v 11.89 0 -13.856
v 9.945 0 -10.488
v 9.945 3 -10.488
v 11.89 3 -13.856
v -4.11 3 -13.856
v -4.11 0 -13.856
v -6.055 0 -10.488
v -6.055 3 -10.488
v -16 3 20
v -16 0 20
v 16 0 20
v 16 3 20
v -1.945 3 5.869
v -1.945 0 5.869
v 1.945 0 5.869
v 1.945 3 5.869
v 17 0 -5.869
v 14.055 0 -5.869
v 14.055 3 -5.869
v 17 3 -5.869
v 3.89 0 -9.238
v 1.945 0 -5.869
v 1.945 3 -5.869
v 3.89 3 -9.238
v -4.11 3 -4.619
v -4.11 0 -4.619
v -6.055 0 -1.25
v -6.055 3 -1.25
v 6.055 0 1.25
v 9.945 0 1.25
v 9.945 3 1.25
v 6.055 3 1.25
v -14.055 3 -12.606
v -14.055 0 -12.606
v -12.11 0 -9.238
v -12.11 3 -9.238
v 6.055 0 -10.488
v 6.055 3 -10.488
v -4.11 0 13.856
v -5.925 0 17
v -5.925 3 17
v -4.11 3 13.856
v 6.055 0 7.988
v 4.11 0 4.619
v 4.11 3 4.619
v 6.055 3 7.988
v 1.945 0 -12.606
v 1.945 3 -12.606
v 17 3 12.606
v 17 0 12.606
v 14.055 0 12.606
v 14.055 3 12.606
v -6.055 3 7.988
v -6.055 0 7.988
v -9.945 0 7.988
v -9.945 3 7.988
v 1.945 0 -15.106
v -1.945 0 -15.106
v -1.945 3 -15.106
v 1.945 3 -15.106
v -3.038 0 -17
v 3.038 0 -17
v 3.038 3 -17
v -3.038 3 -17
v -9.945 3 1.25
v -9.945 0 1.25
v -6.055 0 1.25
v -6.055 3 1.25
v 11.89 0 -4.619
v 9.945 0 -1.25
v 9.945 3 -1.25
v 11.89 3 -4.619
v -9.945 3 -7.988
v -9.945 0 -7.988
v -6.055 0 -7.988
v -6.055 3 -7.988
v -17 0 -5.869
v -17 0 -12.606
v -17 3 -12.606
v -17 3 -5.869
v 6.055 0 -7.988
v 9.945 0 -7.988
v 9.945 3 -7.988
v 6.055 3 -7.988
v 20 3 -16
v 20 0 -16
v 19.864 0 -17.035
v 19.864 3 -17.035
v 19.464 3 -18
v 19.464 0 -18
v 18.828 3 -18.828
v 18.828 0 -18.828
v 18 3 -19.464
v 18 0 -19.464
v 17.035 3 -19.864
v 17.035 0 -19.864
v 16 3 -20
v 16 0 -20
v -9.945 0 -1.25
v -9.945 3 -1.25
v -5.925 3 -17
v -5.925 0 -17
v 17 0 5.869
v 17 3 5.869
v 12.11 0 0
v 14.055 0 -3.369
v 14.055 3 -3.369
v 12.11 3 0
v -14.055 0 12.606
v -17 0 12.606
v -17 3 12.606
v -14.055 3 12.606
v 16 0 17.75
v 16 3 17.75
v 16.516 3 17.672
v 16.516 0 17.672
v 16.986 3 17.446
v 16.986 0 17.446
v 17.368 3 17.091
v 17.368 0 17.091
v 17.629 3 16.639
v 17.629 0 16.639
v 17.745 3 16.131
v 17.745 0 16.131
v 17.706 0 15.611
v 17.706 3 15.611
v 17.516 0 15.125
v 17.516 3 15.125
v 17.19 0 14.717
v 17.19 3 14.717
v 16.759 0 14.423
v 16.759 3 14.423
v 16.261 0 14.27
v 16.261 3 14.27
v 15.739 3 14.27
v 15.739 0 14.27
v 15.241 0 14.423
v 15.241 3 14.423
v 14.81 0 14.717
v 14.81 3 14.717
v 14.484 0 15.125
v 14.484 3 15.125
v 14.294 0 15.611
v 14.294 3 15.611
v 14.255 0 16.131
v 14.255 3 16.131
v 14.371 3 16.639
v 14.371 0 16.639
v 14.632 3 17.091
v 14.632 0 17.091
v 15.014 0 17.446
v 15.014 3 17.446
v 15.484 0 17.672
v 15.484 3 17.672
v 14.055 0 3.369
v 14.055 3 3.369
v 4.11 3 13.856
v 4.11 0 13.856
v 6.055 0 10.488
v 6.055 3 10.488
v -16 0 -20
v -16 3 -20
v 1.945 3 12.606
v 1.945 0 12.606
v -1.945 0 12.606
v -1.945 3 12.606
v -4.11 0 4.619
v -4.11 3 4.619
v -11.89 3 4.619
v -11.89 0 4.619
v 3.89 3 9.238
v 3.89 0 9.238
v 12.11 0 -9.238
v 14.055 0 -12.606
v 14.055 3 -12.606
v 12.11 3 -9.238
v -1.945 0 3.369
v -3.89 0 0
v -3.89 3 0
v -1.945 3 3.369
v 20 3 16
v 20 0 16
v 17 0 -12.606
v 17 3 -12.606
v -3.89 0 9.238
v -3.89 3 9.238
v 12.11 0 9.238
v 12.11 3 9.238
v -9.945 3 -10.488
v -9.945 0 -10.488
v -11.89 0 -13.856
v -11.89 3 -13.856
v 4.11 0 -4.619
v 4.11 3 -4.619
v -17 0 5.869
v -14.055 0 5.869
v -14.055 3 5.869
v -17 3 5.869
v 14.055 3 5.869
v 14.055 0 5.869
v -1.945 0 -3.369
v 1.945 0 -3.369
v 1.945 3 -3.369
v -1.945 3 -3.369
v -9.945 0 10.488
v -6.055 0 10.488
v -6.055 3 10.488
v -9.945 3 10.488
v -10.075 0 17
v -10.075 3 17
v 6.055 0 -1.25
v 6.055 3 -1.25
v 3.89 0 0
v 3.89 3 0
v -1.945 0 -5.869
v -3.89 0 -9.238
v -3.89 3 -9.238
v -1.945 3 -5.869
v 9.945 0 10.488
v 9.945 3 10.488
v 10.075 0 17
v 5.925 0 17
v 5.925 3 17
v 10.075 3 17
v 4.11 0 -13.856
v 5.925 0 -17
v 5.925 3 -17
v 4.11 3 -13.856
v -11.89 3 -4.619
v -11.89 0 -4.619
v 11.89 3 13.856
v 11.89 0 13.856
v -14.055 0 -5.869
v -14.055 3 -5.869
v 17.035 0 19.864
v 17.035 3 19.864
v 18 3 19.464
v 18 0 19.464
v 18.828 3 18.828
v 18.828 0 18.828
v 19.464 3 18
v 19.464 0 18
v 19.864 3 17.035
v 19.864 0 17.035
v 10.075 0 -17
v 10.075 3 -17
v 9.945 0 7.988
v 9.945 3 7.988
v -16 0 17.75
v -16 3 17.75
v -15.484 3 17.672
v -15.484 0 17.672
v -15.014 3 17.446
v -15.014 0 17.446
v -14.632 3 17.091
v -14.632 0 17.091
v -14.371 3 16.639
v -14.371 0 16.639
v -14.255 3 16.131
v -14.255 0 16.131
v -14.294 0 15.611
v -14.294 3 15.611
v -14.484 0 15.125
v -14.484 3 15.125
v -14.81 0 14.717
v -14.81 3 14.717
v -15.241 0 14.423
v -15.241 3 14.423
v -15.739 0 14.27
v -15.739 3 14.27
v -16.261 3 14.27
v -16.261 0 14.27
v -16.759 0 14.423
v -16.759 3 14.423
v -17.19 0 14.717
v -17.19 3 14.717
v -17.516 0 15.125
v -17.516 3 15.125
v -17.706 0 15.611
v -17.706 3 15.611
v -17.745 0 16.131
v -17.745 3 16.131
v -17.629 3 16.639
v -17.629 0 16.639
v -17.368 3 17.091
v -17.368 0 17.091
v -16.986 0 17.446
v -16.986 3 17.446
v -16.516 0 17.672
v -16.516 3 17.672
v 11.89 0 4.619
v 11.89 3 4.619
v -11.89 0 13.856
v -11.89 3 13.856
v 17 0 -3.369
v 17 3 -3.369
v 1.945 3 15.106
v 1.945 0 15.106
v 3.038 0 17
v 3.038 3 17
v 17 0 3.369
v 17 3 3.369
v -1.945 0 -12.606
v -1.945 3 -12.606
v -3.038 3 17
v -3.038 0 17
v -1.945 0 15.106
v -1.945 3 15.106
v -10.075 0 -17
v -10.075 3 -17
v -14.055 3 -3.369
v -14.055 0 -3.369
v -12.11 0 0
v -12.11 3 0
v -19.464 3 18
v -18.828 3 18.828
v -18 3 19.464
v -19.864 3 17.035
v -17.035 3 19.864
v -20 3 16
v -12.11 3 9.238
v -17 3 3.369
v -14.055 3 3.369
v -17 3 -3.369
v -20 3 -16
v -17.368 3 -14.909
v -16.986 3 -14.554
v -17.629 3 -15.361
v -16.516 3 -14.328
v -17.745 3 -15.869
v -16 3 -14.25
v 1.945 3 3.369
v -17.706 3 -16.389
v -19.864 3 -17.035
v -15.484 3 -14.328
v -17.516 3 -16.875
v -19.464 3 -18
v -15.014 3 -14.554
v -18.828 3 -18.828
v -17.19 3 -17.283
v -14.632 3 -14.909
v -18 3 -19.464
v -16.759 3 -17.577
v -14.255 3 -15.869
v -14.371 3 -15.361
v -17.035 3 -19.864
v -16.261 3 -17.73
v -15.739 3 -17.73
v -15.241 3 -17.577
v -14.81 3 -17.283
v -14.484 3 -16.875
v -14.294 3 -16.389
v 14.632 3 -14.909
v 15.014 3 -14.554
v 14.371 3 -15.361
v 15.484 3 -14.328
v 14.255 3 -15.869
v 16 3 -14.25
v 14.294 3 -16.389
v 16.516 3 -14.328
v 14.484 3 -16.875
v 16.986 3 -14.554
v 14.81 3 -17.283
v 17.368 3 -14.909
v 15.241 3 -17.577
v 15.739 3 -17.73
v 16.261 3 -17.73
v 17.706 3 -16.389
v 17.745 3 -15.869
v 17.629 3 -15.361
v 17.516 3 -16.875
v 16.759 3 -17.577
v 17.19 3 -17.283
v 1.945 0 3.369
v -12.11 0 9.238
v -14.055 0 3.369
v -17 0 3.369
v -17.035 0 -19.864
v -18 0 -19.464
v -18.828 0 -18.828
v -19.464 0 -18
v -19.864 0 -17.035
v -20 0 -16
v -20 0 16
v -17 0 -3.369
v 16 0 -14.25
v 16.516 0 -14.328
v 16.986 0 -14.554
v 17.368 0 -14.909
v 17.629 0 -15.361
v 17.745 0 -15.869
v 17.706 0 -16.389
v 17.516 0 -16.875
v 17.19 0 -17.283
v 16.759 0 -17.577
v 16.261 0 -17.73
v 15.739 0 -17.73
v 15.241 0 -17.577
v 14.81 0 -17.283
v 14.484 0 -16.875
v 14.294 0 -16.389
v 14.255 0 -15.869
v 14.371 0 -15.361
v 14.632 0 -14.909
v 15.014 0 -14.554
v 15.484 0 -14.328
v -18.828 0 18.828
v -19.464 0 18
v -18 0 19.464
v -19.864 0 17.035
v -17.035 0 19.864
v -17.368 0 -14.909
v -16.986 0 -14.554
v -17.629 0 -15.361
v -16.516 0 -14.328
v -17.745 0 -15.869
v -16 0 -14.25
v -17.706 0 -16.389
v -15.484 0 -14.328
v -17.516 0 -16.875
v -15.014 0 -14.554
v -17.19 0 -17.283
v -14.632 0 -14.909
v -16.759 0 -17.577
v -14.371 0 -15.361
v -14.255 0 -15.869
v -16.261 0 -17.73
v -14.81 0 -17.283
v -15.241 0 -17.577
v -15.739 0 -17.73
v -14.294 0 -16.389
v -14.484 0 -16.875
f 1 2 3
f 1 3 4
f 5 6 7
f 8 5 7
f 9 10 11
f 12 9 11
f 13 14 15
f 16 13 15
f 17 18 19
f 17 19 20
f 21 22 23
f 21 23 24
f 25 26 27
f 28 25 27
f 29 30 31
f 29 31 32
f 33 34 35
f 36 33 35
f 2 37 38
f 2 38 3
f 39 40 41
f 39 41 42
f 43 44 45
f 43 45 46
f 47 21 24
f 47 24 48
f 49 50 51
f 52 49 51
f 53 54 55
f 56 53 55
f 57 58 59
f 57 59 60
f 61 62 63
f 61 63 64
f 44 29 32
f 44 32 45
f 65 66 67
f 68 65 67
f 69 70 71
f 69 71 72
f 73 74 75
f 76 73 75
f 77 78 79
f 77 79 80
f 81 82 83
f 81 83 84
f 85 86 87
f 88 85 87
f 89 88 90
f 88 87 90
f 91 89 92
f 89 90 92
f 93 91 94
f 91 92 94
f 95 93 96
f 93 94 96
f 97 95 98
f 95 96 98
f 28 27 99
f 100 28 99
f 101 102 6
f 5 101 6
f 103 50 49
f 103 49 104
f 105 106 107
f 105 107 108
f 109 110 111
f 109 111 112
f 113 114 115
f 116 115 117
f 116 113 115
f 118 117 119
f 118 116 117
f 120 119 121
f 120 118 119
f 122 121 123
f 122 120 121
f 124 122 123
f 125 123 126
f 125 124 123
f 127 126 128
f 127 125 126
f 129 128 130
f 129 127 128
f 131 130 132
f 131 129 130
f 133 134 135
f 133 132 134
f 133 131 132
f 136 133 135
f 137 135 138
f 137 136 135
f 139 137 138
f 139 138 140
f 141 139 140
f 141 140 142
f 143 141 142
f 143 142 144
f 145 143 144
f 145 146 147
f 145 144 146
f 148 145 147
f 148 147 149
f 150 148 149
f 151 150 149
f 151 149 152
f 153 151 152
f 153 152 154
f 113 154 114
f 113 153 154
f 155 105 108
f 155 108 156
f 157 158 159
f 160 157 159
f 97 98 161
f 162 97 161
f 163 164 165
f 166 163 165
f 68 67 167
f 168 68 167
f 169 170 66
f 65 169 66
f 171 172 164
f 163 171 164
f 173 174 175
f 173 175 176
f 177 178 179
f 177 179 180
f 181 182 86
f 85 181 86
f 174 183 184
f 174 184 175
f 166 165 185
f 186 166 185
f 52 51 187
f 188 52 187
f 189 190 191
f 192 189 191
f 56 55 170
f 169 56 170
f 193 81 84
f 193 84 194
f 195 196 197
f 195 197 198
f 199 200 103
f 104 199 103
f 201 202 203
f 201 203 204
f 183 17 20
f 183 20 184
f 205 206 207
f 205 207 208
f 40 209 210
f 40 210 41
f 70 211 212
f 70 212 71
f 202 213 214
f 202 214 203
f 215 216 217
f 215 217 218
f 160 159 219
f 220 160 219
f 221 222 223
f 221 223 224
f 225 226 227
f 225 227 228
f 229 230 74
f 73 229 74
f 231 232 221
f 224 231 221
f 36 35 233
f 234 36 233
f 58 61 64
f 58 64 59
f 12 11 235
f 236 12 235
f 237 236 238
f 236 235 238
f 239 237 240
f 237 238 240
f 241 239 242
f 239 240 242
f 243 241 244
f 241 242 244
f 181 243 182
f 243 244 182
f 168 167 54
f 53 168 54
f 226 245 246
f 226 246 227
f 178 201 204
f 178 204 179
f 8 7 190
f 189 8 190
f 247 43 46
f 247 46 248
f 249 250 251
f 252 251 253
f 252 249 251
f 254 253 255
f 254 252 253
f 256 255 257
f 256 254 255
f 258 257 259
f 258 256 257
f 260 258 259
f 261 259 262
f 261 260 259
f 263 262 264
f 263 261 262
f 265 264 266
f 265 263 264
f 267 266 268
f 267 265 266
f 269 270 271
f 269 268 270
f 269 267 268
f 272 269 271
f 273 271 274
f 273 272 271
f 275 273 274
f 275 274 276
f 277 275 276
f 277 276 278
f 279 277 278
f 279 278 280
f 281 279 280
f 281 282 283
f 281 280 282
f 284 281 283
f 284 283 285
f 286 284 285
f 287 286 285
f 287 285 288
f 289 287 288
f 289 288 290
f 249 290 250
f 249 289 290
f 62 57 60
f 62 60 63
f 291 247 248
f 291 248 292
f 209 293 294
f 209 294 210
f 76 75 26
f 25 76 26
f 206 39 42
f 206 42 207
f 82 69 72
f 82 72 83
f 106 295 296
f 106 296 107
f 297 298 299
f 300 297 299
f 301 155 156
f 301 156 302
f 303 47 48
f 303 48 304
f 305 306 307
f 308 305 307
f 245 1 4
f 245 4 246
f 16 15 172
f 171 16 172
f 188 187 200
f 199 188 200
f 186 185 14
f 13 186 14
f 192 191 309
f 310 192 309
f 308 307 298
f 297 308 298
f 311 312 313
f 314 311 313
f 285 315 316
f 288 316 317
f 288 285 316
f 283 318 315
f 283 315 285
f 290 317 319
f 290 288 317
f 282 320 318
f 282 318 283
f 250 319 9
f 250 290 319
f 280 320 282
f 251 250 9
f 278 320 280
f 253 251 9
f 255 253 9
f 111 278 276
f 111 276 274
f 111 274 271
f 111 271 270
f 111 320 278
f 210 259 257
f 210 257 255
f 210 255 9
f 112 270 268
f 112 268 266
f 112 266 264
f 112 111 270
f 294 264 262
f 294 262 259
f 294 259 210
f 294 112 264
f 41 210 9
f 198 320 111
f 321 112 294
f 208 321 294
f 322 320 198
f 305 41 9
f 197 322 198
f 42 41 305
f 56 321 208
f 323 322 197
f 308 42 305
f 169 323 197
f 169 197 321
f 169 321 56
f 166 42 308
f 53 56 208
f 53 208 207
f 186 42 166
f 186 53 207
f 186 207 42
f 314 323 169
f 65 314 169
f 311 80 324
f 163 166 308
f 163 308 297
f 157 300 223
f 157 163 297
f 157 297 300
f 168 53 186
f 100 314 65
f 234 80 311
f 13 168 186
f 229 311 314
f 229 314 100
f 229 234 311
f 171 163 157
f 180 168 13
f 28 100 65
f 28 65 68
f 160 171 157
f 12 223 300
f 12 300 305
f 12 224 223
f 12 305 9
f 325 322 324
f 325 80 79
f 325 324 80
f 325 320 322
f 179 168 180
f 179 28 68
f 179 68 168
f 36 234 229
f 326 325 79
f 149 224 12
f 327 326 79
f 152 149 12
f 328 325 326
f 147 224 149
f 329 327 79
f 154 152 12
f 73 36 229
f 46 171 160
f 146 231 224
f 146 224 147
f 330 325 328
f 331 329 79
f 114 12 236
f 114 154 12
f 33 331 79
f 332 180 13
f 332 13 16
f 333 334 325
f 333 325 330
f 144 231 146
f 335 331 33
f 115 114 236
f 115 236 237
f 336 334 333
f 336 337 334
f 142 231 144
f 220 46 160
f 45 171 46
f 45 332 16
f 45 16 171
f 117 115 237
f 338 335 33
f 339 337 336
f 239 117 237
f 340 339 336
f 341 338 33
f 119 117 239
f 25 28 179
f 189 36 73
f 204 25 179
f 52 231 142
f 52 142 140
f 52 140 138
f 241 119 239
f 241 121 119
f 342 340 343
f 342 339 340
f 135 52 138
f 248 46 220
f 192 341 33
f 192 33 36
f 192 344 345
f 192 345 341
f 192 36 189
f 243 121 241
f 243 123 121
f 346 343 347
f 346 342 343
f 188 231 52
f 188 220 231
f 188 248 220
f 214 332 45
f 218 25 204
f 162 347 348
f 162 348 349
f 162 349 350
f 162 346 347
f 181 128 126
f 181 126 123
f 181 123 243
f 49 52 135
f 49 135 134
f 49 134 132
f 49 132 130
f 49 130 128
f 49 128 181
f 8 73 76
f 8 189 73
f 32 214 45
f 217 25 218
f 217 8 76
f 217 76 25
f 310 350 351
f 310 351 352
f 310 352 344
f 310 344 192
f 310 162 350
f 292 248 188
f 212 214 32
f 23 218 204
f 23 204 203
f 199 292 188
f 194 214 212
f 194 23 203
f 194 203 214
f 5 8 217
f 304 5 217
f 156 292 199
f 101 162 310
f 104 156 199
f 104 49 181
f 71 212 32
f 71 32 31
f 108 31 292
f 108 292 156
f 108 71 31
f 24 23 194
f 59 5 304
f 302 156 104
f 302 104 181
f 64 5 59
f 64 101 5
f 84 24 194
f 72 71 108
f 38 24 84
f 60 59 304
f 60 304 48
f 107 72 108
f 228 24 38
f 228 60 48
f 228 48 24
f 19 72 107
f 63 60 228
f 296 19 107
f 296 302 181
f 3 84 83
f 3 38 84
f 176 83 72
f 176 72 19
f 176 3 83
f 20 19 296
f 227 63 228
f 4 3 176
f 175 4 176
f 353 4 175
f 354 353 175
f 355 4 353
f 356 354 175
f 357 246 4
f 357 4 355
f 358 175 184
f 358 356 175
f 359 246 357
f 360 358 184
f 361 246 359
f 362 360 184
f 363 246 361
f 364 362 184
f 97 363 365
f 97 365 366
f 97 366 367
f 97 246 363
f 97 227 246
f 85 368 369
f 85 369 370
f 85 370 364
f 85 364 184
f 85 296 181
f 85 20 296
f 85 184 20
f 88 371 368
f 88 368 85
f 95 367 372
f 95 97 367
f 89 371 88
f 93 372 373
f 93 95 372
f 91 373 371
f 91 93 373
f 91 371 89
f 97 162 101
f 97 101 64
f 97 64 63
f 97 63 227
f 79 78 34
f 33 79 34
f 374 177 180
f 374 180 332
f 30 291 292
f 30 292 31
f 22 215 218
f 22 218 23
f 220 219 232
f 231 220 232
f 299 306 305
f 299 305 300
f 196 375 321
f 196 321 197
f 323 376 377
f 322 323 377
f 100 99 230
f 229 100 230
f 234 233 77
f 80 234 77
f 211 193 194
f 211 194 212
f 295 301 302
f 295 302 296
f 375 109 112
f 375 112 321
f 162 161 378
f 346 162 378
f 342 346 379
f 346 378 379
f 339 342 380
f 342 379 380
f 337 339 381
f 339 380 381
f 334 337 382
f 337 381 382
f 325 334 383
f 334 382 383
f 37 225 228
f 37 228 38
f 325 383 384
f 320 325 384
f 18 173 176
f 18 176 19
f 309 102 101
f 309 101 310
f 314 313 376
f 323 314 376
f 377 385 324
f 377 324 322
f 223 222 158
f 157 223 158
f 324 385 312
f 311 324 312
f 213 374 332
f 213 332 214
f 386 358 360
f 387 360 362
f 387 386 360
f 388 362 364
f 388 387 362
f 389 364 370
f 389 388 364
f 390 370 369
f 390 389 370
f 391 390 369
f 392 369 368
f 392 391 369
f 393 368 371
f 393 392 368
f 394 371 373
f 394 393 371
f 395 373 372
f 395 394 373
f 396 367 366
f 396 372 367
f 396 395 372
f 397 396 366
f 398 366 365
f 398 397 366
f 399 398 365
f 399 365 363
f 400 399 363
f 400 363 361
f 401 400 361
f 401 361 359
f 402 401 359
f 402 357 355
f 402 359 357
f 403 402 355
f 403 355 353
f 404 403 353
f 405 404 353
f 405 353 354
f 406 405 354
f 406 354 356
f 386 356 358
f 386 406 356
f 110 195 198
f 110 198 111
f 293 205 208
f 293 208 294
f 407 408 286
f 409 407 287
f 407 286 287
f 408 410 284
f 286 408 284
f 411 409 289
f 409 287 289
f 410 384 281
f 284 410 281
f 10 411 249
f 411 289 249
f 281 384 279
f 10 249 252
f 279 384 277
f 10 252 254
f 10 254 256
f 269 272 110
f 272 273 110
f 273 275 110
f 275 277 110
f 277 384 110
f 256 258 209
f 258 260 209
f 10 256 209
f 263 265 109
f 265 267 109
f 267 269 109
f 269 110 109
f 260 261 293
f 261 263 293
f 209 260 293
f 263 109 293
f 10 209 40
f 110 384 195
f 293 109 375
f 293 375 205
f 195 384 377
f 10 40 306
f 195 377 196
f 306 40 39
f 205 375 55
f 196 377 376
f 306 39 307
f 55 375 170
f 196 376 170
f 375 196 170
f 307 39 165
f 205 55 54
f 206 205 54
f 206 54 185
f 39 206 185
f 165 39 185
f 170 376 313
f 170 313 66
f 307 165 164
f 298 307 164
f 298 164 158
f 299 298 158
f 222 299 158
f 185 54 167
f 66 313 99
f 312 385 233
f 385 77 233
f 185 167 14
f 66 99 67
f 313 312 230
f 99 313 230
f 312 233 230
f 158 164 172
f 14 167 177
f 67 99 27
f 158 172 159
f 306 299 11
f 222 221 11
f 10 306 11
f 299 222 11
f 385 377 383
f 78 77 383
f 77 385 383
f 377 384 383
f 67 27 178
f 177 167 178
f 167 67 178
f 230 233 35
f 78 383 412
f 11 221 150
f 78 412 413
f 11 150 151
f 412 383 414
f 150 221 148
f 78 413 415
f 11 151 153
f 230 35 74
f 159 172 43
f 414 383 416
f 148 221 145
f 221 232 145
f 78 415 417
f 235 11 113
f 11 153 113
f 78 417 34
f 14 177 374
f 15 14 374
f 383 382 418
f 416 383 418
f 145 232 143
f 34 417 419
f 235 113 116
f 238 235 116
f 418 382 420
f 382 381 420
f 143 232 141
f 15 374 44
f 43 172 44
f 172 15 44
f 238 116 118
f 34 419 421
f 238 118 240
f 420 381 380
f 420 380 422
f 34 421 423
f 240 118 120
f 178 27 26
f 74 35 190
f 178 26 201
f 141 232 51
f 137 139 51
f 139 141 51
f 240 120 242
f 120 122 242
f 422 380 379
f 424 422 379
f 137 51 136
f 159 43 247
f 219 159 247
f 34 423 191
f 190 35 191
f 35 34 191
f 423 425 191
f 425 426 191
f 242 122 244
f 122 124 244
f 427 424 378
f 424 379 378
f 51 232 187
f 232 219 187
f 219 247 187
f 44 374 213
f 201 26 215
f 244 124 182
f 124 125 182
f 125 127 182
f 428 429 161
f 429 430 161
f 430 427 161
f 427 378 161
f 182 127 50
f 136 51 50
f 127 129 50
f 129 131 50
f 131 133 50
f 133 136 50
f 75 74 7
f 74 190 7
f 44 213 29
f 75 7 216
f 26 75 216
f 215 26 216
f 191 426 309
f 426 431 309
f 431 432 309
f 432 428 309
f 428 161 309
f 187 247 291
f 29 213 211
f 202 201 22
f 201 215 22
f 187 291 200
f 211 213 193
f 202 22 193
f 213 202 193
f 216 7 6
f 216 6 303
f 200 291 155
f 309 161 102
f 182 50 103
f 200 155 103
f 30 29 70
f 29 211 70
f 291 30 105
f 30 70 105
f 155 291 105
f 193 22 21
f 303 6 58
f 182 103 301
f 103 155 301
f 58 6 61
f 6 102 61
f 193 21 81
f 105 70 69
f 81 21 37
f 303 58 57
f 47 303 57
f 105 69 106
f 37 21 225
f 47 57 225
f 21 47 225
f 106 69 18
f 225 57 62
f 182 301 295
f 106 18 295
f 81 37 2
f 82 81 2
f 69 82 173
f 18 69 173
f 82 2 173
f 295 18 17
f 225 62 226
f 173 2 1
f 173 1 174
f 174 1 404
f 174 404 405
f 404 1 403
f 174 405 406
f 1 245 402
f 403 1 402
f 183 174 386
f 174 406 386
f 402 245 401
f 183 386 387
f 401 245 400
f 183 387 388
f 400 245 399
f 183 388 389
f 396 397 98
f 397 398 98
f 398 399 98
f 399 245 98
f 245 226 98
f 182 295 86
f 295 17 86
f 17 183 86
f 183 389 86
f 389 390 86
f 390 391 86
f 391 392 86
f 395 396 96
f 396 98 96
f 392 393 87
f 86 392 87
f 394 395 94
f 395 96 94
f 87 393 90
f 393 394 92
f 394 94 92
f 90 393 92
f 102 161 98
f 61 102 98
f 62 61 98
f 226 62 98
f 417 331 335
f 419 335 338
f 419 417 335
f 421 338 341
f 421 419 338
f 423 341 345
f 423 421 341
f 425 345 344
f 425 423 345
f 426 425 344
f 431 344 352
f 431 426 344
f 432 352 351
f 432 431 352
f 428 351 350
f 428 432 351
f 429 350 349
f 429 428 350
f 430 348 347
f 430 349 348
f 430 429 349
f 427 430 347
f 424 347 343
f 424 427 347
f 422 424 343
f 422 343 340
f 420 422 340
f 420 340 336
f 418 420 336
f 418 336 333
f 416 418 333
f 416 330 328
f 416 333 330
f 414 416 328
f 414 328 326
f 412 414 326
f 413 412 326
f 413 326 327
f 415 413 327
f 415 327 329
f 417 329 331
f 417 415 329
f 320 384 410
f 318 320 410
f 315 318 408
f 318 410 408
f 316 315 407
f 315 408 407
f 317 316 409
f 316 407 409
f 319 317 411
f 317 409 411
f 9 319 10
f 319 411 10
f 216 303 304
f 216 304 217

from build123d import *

# Parameters (mm, degrees)
SKETCH1_R           = 1.75
BOSS_EXTRUDE1_DEPTH = 3
CUT_EXTRUDE1_DEPTH  = 29.442925307
BOSS_EXTRUDE2_DEPTH = 3
SKETCH1_3_R         = 1.75
CUT_EXTRUDE2_DEPTH  = 29.442925307


with BuildPart() as part:
    # Sketch1 → Boss-Extrude1 (new body)
    # profile 1 of 5: a face of its own
    with BuildSketch(Plane(origin=(0, 0, 0), x_dir=(1, 0, 0), z_dir=(0, 1, 0))):
        with BuildLine():
            Line((-16, -20), (16, -20))
            ThreePointArc((16, -20), (18.828427125, -18.828427125), (20, -16))
            Line((20, -16), (20, 16))
            ThreePointArc((20, 16), (18.828427125, 18.828427125), (16, 20))
            Line((16, 20), (-16, 20))
            ThreePointArc((-16, 20), (-18.828427125, 18.828427125), (-20, 16))
            Line((-20, 16), (-20, -16))
            ThreePointArc((-20, -16), (-18.828427125, -18.828427125), (-16, -20))
        make_face()
        with Locations((-16, 16)):
            Circle(SKETCH1_R, mode=Mode.SUBTRACT)
        with Locations((16, 16)):
            Circle(SKETCH1_R, mode=Mode.SUBTRACT)
        with Locations((16, -16)):
            Circle(SKETCH1_R, mode=Mode.SUBTRACT)
        with Locations((-16, -16)):
            Circle(SKETCH1_R, mode=Mode.SUBTRACT)
    # profile 2 of 5: a face of its own
    with BuildSketch(Plane(origin=(0, 0, 0), x_dir=(1, 0, 0), z_dir=(0, 1, 0))):
        with Locations((-16, 16)):
            Circle(SKETCH1_R)
    # profile 3 of 5: a face of its own
    with BuildSketch(Plane(origin=(0, 0, 0), x_dir=(1, 0, 0), z_dir=(0, 1, 0))):
        with Locations((16, 16)):
            Circle(SKETCH1_R)
    # profile 4 of 5: a face of its own
    with BuildSketch(Plane(origin=(0, 0, 0), x_dir=(1, 0, 0), z_dir=(0, 1, 0))):
        with Locations((16, -16)):
            Circle(SKETCH1_R)
    # profile 5 of 5: a face of its own
    with BuildSketch(Plane(origin=(0, 0, 0), x_dir=(1, 0, 0), z_dir=(0, 1, 0))):
        with Locations((-16, -16)):
            Circle(SKETCH1_R)
    extrude(amount=BOSS_EXTRUDE1_DEPTH)

    # Sketch3 → Cut-Extrude1 (cut, through all)
    with BuildSketch(Plane(origin=(0, 0, 0), x_dir=(1, 0, 0), z_dir=(0, 1, 0))):
        Polygon((6.05502117, -1.25), (4.11004234, -4.618802154), (6.05502117, -7.987604307), (9.94497883, -7.987604307), (11.88995766, -4.618802154), (9.94497883, -1.25), align=None)
        Polygon((-1.94497883, 3.368802154), (-3.88995766, 0), (-1.94497883, -3.368802154), (1.94497883, -3.368802154), (3.88995766, 0), (1.94497883, 3.368802154), align=None)
        Polygon((14.05502117, 3.368802154), (12.11004234, 0), (14.05502117, -3.368802154), (17.94497883, -3.368802154), (19.88995766, 0), (17.94497883, 3.368802154), align=None)
        Polygon((22.05502117, -1.25), (20.11004234, -4.618802154), (22.05502117, -7.987604307), (25.94497883, -7.987604307), (27.88995766, -4.618802154), (25.94497883, -1.25), align=None)
        Polygon((14.05502117, 12.606402154), (12.11004234, 9.2376), (14.05502117, 5.868797846), (17.94497883, 5.868797846), (19.88995766, 9.2376), (17.94497883, 12.606402154), align=None)
        Polygon((22.05502117, 7.9876), (20.11004234, 4.618797846), (22.05502117, 1.249995693), (25.94497883, 1.249995693), (27.88995766, 4.618797846), (25.94497883, 7.9876), align=None)
        Polygon((14.05502117, 21.844002154), (12.11004234, 18.4752), (14.05502117, 15.106397846), (17.94497883, 15.106397846), (19.88995766, 18.4752), (17.94497883, 21.844002154), align=None)
        Polygon((22.05502117, 17.2252), (20.11004234, 13.856397846), (22.05502117, 10.487595693), (25.94497883, 10.487595693), (27.88995766, 13.856397846), (25.94497883, 17.2252), align=None)
        Polygon((-1.94497883, 12.606402154), (-3.88995766, 9.2376), (-1.94497883, 5.868797846), (1.94497883, 5.868797846), (3.88995766, 9.2376), (1.94497883, 12.606402154), align=None)
        Polygon((6.05502117, 7.9876), (4.11004234, 4.618797846), (6.05502117, 1.249995693), (9.94497883, 1.249995693), (11.88995766, 4.618797846), (9.94497883, 7.9876), align=None)
        Polygon((-1.94497883, 21.844002154), (-3.88995766, 18.4752), (-1.94497883, 15.106397846), (1.94497883, 15.106397846), (3.88995766, 18.4752), (1.94497883, 21.844002154), align=None)
        Polygon((6.05502117, 17.2252), (4.11004234, 13.856397846), (6.05502117, 10.487595693), (9.94497883, 10.487595693), (11.88995766, 13.856397846), (9.94497883, 17.2252), align=None)
        Polygon((-9.94497883, -1.25), (-6.05502117, -1.25), (-4.11004234, -4.618802154), (-6.05502117, -7.987604307), (-9.94497883, -7.987604307), (-11.88995766, -4.618802154), align=None)
        Polygon((-9.94497883, 7.9876), (-6.05502117, 7.9876), (-4.11004234, 4.618797846), (-6.05502117, 1.249995693), (-9.94497883, 1.249995693), (-11.88995766, 4.618797846), align=None)
        Polygon((-9.94497883, 17.2252), (-6.05502117, 17.2252), (-4.11004234, 13.856397846), (-6.05502117, 10.487595693), (-9.94497883, 10.487595693), (-11.88995766, 13.856397846), align=None)
        Polygon((-17.94497883, 12.606402154), (-14.05502117, 12.606402154), (-12.11004234, 9.2376), (-14.05502117, 5.868797846), (-17.94497883, 5.868797846), (-19.88995766, 9.2376), align=None)
        Polygon((-17.94497883, 3.368802154), (-14.05502117, 3.368802154), (-12.11004234, 0), (-14.05502117, -3.368802154), (-17.94497883, -3.368802154), (-19.88995766, 0), align=None)
        Polygon((-25.94497883, -1.25), (-22.05502117, -1.25), (-20.11004234, -4.618802154), (-22.05502117, -7.987604307), (-25.94497883, -7.987604307), (-27.88995766, -4.618802154), align=None)
        Polygon((-25.94497883, 7.9876), (-22.05502117, 7.9876), (-20.11004234, 4.618797846), (-22.05502117, 1.249995693), (-25.94497883, 1.249995693), (-27.88995766, 4.618797846), align=None)
        Polygon((-25.94497883, 17.2252), (-22.05502117, 17.2252), (-20.11004234, 13.856397846), (-22.05502117, 10.487595693), (-25.94497883, 10.487595693), (-27.88995766, 13.856397846), align=None)
        Polygon((-17.94497883, 21.844002154), (-14.05502117, 21.844002154), (-12.11004234, 18.4752), (-14.05502117, 15.106397846), (-17.94497883, 15.106397846), (-19.88995766, 18.4752), align=None)
        Polygon((17.94497883, -21.844002154), (14.05502117, -21.844002154), (12.11004234, -18.4752), (14.05502117, -15.106397846), (17.94497883, -15.106397846), (19.88995766, -18.4752), align=None)
        Polygon((25.94497883, -17.2252), (22.05502117, -17.2252), (20.11004234, -13.856397846), (22.05502117, -10.487595693), (25.94497883, -10.487595693), (27.88995766, -13.856397846), align=None)
        Polygon((17.94497883, -12.606402154), (14.05502117, -12.606402154), (12.11004234, -9.2376), (14.05502117, -5.868797846), (17.94497883, -5.868797846), (19.88995766, -9.2376), align=None)
        Polygon((9.94497883, -17.2252), (6.05502117, -17.2252), (4.11004234, -13.856397846), (6.05502117, -10.487595693), (9.94497883, -10.487595693), (11.88995766, -13.856397846), align=None)
        Polygon((1.94497883, -21.844002154), (-1.94497883, -21.844002154), (-3.88995766, -18.4752), (-1.94497883, -15.106397846), (1.94497883, -15.106397846), (3.88995766, -18.4752), align=None)
        Polygon((1.94497883, -12.606402154), (-1.94497883, -12.606402154), (-3.88995766, -9.2376), (-1.94497883, -5.868797846), (1.94497883, -5.868797846), (3.88995766, -9.2376), align=None)
        Polygon((-11.88995766, -13.856397846), (-9.94497883, -17.2252), (-6.05502117, -17.2252), (-4.11004234, -13.856397846), (-6.05502117, -10.487595693), (-9.94497883, -10.487595693), align=None)
        Polygon((-19.88995766, -18.4752), (-17.94497883, -21.844002154), (-14.05502117, -21.844002154), (-12.11004234, -18.4752), (-14.05502117, -15.106397846), (-17.94497883, -15.106397846), align=None)
        Polygon((-27.88995766, -13.856397846), (-25.94497883, -17.2252), (-22.05502117, -17.2252), (-20.11004234, -13.856397846), (-22.05502117, -10.487595693), (-25.94497883, -10.487595693), align=None)
        Polygon((-19.88995766, -9.2376), (-17.94497883, -12.606402154), (-14.05502117, -12.606402154), (-12.11004234, -9.2376), (-14.05502117, -5.868797846), (-17.94497883, -5.868797846), align=None)
    extrude(amount=CUT_EXTRUDE1_DEPTH, mode=Mode.SUBTRACT)

    # Sketch4 → Boss-Extrude2 (add, through all)
    with BuildSketch(Plane(origin=(0, 0, 0), x_dir=(1, 0, 0), z_dir=(0, 1, 0))):
        with BuildLine():
            Line((-20, 16), (-20, -16))
            ThreePointArc((-20, -16), (-18.828427125, -18.828427125), (-16, -20))
            Line((-16, -20), (16, -20))
            ThreePointArc((16, -20), (18.828427125, -18.828427125), (20, -16))
            Line((20, -16), (20, 16))
            ThreePointArc((20, 16), (18.828427125, 18.828427125), (16, 20))
            Line((16, 20), (-16, 20))
            ThreePointArc((-16, 20), (-18.828427125, 18.828427125), (-20, 16))
        make_face()
        Polygon((12.961749457, 17), (-12.961749457, 17), (-14.05502117, 15.106397846), (-17, 15.106397846), (-17, -15.106397846), (-14.05502117, -15.106397846), (-12.961749457, -17), (12.961749457, -17), (14.05502117, -15.106397846), (17, -15.106397846), (17, 15.106397846), (14.05502117, 15.106397846), align=None, mode=Mode.SUBTRACT)
    extrude(amount=BOSS_EXTRUDE2_DEPTH)

    # Sketch1<3> → Cut-Extrude2 (cut, through all)
    with BuildSketch(Plane(origin=(0, 0, 0), x_dir=(1, 0, 0), z_dir=(0, 1, 0))):
        with Locations(Location((16, 16, 0), (0, 0, 270))):
            Circle(SKETCH1_3_R)
        with Locations(Location((-16, -16, 0), (0, 0, 270))):
            Circle(SKETCH1_3_R)
        with Locations(Location((16, -16, 0), (0, 0, 270))):
            Circle(SKETCH1_3_R)
        with Locations(Location((-16, 16, 0), (0, 0, 270))):
            Circle(SKETCH1_3_R)
    extrude(amount=CUT_EXTRUDE2_DEPTH, mode=Mode.SUBTRACT)


solid = part.part
